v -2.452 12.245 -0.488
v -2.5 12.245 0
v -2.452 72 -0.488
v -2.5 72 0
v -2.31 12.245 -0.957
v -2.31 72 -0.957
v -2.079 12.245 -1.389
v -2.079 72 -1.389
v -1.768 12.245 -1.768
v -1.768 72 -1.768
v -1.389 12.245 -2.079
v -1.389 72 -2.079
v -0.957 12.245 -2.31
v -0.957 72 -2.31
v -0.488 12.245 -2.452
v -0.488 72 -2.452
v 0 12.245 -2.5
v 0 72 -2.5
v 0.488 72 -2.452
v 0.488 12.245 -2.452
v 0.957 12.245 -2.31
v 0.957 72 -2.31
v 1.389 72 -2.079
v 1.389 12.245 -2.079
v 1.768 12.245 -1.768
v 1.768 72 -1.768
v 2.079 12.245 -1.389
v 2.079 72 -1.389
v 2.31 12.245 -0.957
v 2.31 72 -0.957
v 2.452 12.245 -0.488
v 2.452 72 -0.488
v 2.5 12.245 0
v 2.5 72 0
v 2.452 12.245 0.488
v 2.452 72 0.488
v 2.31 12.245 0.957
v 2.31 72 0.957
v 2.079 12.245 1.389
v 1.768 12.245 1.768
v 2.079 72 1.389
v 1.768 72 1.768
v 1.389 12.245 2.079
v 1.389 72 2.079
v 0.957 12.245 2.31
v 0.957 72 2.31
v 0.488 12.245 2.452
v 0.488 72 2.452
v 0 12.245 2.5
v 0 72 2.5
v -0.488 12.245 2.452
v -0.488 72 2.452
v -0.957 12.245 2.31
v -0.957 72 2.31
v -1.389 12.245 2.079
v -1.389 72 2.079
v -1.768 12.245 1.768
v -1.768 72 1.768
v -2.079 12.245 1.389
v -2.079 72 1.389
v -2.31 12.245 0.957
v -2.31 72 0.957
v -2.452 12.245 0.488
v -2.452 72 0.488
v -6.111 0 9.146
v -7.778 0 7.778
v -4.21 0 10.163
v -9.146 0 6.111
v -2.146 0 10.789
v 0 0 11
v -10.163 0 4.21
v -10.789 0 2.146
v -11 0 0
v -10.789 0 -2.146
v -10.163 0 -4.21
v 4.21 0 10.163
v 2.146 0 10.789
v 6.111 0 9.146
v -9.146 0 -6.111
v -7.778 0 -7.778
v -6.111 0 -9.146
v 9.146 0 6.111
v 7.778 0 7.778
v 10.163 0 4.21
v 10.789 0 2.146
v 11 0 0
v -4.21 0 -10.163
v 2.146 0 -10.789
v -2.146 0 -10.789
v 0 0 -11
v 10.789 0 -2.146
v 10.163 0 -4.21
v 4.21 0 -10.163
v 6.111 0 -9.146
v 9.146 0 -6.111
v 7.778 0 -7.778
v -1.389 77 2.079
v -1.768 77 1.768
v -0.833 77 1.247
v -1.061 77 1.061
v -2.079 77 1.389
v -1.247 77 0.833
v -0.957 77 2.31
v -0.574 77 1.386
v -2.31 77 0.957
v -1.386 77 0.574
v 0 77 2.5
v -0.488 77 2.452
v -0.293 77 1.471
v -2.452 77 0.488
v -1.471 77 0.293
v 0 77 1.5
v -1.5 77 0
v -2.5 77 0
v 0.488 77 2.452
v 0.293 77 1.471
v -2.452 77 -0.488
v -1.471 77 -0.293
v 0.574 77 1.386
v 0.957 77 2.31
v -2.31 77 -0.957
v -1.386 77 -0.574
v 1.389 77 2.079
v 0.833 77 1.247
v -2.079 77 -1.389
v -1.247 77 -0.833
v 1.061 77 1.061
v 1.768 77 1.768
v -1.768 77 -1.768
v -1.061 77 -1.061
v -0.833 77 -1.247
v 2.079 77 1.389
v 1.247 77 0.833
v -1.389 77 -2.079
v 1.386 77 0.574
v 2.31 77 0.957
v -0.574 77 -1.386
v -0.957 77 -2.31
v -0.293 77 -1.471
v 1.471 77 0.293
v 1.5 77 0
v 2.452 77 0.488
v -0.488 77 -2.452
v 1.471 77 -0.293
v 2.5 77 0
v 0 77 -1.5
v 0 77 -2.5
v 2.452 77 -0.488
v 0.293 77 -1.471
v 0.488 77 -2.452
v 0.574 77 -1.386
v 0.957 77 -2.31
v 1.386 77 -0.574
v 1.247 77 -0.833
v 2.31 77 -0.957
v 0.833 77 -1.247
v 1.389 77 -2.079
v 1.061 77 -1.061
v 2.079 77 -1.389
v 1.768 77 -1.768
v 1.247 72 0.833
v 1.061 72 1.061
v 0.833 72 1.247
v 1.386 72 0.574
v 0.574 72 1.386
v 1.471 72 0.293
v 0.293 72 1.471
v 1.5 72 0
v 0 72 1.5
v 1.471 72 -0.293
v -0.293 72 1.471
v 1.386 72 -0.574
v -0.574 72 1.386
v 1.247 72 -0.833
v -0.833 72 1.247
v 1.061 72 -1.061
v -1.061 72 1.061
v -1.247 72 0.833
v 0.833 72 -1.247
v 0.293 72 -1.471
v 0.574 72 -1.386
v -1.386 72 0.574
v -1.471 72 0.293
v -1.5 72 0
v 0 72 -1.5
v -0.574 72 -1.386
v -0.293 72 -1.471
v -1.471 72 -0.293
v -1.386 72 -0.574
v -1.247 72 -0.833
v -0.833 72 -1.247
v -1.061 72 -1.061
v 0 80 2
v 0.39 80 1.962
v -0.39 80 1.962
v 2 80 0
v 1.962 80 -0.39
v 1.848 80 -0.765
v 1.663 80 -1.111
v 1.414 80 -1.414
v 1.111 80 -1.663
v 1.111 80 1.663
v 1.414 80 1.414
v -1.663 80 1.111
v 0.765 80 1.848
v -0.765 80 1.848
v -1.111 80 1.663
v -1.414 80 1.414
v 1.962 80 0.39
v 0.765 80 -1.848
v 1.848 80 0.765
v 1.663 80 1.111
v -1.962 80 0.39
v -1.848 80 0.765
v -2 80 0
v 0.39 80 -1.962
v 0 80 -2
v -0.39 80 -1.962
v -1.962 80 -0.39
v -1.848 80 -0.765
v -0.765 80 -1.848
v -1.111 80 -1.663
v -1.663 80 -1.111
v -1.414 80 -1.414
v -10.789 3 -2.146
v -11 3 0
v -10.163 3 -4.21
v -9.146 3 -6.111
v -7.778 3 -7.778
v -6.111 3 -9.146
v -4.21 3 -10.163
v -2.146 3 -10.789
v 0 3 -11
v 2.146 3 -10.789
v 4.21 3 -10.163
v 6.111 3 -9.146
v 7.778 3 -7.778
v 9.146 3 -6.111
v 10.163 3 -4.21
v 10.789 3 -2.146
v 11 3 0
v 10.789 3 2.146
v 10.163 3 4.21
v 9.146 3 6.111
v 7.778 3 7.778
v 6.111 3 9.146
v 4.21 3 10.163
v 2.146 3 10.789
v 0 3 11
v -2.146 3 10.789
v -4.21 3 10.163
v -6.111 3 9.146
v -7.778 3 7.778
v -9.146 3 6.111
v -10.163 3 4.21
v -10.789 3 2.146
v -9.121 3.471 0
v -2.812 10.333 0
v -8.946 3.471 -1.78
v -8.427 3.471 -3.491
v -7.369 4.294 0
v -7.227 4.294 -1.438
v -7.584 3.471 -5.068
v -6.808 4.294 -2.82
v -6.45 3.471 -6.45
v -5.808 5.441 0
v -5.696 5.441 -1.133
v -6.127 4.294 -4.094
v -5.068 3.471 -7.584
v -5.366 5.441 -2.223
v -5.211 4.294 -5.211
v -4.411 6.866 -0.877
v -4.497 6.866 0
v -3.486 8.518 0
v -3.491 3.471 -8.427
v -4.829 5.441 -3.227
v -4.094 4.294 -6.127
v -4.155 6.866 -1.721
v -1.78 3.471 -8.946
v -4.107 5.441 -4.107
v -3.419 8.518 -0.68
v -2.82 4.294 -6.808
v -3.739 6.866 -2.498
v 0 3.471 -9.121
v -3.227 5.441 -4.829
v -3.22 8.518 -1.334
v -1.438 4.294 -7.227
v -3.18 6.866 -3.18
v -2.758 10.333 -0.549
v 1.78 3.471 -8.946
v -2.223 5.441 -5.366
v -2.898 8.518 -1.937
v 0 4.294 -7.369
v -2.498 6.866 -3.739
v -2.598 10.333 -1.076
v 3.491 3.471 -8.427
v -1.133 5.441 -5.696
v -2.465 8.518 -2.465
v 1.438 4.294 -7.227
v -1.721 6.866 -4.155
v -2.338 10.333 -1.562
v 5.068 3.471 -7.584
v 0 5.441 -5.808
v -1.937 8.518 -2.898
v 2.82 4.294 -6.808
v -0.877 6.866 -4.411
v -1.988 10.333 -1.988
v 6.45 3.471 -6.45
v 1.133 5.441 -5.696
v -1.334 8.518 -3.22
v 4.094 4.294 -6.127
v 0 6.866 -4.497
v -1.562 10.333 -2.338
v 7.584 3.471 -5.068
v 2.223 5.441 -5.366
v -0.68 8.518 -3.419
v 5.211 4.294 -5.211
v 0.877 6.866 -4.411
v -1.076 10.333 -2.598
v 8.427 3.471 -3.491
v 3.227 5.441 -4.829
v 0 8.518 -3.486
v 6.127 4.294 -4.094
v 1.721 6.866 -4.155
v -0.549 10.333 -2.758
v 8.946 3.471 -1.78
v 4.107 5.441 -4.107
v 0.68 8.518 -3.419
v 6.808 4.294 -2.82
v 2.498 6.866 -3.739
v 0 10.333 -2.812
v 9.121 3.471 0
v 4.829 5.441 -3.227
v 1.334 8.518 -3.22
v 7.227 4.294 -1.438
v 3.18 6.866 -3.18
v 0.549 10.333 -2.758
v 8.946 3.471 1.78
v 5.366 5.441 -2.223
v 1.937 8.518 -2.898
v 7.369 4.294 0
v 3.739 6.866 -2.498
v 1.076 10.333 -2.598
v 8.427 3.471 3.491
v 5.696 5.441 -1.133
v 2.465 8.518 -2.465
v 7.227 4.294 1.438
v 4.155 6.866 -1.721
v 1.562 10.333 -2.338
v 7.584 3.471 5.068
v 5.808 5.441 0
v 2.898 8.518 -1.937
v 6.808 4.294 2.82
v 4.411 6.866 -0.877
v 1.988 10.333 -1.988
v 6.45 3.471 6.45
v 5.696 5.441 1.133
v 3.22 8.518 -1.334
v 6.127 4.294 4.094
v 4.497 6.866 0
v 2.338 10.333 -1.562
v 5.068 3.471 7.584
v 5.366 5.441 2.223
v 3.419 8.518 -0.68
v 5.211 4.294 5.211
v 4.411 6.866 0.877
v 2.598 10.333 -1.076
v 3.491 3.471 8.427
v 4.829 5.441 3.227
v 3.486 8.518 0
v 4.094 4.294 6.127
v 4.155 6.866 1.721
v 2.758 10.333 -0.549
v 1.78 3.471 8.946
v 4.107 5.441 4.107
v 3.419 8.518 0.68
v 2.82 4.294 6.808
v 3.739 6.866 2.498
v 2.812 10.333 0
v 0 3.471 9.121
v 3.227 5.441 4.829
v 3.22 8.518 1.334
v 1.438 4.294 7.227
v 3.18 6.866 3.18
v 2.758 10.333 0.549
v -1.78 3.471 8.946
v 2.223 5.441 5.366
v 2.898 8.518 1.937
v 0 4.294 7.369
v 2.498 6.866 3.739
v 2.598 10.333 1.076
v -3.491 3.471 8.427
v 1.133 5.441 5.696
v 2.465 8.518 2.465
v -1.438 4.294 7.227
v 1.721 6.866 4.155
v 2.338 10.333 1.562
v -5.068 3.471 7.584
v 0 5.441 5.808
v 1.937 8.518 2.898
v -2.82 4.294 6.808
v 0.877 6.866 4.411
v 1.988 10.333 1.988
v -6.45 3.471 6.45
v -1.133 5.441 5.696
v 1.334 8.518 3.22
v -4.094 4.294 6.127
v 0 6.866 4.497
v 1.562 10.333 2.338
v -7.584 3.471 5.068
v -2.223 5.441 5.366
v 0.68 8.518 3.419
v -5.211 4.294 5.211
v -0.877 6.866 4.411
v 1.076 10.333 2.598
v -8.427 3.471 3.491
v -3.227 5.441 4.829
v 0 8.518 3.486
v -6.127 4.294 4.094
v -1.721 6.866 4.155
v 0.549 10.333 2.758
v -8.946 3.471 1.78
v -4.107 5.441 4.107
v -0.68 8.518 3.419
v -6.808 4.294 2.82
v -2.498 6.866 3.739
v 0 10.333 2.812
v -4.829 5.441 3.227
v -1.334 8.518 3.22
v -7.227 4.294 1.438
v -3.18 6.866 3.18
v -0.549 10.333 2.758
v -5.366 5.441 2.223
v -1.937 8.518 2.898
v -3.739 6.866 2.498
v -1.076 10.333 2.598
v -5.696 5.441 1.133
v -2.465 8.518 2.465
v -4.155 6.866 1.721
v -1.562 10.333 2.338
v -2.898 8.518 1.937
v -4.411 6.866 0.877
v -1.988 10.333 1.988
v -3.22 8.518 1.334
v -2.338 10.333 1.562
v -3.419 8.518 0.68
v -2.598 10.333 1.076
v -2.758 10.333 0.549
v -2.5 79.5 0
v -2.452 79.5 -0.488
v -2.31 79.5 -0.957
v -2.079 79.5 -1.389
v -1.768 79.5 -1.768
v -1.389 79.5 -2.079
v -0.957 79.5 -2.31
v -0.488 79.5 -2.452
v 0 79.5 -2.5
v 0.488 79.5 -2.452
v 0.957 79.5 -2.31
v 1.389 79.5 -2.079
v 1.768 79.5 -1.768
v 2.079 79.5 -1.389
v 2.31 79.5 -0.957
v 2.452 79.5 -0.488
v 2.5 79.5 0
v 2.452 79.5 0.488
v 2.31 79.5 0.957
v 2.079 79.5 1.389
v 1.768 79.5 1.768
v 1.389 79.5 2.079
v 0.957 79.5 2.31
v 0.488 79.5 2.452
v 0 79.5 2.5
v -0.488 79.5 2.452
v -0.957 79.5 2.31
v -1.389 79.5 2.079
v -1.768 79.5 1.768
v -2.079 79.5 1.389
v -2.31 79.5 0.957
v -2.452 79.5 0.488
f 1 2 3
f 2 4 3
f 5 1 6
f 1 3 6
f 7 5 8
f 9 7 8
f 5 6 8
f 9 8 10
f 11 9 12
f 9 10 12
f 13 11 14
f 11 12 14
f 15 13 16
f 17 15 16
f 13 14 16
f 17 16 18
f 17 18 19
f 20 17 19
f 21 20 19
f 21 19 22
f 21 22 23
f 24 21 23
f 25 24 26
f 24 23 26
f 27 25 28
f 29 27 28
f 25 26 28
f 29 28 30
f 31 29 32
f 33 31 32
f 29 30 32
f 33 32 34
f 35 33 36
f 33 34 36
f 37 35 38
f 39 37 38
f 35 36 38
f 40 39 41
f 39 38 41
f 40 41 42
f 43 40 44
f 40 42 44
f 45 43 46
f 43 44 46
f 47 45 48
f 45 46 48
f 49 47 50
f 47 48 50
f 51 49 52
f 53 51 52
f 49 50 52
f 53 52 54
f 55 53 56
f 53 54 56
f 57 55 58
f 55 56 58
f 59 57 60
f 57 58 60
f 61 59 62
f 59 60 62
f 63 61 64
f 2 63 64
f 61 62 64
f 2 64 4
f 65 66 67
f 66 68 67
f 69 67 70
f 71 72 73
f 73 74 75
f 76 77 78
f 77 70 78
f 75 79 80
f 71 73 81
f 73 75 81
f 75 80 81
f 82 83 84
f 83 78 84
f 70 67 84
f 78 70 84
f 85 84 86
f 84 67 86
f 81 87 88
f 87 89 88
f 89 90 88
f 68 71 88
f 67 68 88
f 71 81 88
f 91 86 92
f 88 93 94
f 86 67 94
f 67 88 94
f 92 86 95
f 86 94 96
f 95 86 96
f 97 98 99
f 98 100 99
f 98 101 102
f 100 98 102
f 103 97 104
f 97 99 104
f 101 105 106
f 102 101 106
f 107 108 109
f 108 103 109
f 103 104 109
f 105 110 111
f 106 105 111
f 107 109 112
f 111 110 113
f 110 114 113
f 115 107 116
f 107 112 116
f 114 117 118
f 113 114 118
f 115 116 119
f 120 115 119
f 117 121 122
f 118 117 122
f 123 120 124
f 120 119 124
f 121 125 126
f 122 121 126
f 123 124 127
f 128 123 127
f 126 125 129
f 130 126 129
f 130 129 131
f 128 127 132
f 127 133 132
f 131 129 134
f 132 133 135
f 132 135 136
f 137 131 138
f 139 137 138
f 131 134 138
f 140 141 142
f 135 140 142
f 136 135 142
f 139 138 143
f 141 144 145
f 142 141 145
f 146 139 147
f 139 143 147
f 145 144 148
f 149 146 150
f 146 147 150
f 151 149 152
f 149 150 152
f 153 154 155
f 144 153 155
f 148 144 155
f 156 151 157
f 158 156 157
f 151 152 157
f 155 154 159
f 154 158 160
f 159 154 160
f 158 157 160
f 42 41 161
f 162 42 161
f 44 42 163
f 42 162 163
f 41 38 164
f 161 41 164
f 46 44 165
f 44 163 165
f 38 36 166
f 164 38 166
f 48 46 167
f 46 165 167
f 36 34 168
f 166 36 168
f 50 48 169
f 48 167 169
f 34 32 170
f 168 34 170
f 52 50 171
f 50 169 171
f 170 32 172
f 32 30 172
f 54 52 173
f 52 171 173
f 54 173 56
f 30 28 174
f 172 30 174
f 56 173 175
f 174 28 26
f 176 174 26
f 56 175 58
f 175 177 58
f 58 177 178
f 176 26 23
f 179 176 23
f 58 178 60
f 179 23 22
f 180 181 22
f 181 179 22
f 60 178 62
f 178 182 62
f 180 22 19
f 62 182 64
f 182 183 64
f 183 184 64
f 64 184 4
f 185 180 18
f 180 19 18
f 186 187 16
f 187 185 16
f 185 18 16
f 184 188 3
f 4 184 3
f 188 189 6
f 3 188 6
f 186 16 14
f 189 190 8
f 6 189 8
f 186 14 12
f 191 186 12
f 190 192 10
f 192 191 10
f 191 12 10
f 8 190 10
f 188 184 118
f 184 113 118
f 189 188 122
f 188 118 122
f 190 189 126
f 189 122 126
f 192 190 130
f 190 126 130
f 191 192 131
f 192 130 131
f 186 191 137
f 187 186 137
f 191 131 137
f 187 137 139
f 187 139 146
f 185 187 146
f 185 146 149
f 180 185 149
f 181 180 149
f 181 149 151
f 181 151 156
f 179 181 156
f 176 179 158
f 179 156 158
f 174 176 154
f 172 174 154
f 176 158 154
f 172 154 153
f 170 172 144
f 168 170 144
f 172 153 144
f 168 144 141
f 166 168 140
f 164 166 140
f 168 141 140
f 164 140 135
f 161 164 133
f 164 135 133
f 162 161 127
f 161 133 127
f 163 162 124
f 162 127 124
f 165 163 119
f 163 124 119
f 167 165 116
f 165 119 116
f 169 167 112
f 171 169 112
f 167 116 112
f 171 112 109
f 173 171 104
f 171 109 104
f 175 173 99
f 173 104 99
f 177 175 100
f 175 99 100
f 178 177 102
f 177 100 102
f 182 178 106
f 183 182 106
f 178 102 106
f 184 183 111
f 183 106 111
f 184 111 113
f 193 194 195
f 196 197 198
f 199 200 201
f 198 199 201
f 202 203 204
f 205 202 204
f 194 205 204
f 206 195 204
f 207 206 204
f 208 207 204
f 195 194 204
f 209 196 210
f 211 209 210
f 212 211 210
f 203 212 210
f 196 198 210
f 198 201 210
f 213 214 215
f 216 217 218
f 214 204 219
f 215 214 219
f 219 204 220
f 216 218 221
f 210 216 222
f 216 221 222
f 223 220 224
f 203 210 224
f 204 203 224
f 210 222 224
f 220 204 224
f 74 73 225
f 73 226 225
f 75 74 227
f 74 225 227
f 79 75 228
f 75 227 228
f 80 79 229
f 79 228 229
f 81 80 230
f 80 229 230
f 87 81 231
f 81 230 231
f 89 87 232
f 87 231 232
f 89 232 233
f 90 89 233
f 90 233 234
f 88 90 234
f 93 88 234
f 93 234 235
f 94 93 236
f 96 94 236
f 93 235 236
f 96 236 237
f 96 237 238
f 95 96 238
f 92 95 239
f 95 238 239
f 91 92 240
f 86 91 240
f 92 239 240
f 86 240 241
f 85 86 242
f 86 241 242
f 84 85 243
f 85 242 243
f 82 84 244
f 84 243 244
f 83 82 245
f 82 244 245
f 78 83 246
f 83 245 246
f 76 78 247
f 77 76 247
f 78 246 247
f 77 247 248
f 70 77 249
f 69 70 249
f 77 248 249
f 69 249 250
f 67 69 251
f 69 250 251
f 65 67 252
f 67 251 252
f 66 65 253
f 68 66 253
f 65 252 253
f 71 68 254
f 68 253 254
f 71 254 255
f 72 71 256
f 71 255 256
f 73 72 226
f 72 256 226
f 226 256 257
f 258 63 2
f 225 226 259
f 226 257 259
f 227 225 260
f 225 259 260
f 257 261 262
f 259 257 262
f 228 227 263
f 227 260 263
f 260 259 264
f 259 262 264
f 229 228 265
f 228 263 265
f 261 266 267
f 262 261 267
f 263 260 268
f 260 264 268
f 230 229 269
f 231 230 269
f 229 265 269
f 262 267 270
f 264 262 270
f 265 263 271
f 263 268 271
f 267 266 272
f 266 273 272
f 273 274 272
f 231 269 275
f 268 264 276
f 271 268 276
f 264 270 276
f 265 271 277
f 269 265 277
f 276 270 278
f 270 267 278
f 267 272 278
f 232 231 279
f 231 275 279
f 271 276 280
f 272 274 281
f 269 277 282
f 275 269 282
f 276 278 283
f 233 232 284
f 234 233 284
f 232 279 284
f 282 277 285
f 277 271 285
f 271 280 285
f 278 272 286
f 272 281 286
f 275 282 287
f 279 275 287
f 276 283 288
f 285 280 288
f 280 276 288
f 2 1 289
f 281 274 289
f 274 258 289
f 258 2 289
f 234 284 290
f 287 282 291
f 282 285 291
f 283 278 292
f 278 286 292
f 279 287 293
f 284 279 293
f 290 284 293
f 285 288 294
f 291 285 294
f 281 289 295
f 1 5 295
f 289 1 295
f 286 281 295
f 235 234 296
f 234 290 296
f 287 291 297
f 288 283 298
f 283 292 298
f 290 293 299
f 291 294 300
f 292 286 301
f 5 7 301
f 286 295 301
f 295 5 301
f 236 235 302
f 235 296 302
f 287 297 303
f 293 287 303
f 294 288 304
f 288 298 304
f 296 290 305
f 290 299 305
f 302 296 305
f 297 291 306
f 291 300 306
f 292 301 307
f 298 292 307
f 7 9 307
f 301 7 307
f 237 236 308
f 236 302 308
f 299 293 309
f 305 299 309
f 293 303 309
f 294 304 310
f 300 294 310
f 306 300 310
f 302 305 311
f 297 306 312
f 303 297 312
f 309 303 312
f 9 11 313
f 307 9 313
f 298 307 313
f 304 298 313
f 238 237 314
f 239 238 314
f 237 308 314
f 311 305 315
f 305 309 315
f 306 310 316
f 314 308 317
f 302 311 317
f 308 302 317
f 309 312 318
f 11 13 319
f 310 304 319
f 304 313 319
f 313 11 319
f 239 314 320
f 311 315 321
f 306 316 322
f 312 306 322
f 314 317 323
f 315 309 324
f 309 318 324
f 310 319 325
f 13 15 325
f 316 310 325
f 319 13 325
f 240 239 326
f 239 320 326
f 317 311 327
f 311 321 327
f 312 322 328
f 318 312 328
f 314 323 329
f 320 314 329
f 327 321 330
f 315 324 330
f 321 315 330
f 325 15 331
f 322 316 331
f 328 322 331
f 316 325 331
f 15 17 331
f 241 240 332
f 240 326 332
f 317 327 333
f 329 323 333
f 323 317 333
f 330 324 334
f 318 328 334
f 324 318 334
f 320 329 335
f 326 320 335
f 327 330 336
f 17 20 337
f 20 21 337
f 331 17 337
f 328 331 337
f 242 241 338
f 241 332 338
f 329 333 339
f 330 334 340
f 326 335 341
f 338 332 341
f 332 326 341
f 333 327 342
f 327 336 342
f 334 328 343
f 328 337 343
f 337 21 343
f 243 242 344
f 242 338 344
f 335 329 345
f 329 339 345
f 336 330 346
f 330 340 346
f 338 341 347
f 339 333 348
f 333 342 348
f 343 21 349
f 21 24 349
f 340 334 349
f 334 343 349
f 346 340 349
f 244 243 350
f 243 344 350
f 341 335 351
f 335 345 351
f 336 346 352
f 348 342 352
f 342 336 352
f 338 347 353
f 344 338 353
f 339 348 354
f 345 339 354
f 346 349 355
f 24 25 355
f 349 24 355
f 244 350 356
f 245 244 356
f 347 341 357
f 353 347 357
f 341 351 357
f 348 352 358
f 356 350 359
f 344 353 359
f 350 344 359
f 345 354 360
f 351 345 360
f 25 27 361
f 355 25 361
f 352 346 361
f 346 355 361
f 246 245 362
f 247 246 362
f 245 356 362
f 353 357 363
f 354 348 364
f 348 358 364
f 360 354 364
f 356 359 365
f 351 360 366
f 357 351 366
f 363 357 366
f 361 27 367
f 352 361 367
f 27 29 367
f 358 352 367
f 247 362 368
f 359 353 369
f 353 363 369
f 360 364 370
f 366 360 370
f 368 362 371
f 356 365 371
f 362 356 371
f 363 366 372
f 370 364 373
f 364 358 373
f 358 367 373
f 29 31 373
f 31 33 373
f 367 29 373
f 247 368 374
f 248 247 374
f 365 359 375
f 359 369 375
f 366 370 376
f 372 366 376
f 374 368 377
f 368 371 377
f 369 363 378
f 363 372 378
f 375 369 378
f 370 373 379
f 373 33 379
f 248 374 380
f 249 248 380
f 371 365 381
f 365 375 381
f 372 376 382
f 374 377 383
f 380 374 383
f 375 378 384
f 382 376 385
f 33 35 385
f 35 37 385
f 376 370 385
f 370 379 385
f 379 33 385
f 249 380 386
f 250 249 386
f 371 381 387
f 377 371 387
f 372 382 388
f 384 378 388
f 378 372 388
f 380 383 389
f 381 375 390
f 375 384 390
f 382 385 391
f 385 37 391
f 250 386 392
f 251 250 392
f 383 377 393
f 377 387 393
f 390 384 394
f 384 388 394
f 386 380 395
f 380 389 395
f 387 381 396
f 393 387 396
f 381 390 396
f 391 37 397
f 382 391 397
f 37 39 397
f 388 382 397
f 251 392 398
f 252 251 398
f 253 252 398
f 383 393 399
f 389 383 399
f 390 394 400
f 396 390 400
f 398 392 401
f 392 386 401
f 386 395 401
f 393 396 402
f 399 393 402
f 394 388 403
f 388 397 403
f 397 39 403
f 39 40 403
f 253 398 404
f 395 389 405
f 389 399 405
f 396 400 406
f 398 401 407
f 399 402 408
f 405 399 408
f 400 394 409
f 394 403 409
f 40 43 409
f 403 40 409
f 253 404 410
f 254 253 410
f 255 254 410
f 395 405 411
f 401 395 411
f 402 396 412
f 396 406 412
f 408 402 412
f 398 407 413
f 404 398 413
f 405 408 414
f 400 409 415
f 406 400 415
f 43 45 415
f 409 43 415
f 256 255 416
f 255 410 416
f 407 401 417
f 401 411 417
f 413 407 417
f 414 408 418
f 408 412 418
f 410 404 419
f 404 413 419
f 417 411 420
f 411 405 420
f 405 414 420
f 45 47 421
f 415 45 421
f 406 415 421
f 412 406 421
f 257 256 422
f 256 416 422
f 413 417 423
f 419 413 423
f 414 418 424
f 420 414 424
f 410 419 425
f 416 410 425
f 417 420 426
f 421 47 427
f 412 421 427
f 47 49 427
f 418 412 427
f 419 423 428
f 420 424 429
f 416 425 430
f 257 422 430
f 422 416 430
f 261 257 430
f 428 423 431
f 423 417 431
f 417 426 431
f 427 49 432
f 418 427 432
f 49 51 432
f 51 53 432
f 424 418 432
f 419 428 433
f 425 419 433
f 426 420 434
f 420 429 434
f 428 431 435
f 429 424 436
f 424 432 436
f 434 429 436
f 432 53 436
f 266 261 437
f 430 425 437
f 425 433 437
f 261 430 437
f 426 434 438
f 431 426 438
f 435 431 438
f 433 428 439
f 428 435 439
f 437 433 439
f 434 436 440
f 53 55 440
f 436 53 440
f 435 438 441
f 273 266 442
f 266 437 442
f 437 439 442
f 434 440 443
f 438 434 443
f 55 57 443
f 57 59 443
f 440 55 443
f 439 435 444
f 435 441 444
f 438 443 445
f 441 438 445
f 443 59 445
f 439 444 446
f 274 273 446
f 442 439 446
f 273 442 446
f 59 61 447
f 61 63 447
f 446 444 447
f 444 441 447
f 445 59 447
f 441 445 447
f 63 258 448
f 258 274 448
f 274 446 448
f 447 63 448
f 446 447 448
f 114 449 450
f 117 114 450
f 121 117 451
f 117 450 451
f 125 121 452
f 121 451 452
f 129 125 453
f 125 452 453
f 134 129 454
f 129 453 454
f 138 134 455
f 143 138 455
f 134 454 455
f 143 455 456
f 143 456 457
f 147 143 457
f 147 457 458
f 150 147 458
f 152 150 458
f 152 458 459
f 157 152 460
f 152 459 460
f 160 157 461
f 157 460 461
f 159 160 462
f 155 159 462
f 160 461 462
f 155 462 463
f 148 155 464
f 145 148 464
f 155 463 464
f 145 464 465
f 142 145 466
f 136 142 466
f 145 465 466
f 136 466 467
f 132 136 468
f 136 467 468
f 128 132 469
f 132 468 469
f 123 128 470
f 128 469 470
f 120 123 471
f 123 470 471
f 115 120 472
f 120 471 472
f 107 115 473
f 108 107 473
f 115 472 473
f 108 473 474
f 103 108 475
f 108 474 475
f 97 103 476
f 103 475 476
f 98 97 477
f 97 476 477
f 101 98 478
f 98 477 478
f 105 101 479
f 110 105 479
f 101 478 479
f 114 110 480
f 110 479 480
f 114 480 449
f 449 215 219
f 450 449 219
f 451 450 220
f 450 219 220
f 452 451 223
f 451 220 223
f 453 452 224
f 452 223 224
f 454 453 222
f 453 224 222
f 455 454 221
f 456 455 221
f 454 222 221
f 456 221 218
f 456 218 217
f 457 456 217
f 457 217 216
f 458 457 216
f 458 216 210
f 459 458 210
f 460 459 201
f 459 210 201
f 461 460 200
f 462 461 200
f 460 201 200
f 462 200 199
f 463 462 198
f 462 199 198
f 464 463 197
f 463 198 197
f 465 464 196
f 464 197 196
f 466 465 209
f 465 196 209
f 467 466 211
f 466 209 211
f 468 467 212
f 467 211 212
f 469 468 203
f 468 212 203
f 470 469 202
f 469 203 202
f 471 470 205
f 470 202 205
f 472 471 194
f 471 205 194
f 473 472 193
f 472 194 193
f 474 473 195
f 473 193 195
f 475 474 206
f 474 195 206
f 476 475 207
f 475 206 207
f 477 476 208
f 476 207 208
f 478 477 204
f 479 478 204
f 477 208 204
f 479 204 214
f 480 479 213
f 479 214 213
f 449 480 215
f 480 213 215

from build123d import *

# Parameters (mm, degrees)
CHAMFER1_SIZE = 0.5


with BuildPart() as part:
    # Sketch1 → Revolve1 (revolve)
    with BuildSketch(Plane.XY, mode=Mode.PRIVATE) as revolve1_sk:
        with BuildLine():
            Line((0, 0), (11, 0))
            Line((11, 0), (11, 3))
            ThreePointArc((11, 3), (5.117826553, 6.121629363), (2.5, 12.244661169))
            Line((2.5, 12.244661169), (2.5, 72))
            Line((2.5, 72), (1.5, 72))
            Line((1.5, 72), (1.5, 77))
            Line((1.5, 77), (2.5, 77))
            Line((2.5, 77), (2.5, 80))
            Line((2.5, 80), (0, 80))
            Line((0, 80), (0, 0))
        make_face()
    revolve(revolve1_sk.sketch.rotate(Axis((0, 80, 0), (0, -1, 0)), 180), axis=Axis((0, 80, 0), (0, -1, 0)))

    # Chamfer1
    chamfer1_edges = [part.edges().sort_by_distance(p)[0] for p in [
        (2.5, 80, 0),
    ]]
    chamfer(chamfer1_edges, length=CHAMFER1_SIZE)


solid = part.part
